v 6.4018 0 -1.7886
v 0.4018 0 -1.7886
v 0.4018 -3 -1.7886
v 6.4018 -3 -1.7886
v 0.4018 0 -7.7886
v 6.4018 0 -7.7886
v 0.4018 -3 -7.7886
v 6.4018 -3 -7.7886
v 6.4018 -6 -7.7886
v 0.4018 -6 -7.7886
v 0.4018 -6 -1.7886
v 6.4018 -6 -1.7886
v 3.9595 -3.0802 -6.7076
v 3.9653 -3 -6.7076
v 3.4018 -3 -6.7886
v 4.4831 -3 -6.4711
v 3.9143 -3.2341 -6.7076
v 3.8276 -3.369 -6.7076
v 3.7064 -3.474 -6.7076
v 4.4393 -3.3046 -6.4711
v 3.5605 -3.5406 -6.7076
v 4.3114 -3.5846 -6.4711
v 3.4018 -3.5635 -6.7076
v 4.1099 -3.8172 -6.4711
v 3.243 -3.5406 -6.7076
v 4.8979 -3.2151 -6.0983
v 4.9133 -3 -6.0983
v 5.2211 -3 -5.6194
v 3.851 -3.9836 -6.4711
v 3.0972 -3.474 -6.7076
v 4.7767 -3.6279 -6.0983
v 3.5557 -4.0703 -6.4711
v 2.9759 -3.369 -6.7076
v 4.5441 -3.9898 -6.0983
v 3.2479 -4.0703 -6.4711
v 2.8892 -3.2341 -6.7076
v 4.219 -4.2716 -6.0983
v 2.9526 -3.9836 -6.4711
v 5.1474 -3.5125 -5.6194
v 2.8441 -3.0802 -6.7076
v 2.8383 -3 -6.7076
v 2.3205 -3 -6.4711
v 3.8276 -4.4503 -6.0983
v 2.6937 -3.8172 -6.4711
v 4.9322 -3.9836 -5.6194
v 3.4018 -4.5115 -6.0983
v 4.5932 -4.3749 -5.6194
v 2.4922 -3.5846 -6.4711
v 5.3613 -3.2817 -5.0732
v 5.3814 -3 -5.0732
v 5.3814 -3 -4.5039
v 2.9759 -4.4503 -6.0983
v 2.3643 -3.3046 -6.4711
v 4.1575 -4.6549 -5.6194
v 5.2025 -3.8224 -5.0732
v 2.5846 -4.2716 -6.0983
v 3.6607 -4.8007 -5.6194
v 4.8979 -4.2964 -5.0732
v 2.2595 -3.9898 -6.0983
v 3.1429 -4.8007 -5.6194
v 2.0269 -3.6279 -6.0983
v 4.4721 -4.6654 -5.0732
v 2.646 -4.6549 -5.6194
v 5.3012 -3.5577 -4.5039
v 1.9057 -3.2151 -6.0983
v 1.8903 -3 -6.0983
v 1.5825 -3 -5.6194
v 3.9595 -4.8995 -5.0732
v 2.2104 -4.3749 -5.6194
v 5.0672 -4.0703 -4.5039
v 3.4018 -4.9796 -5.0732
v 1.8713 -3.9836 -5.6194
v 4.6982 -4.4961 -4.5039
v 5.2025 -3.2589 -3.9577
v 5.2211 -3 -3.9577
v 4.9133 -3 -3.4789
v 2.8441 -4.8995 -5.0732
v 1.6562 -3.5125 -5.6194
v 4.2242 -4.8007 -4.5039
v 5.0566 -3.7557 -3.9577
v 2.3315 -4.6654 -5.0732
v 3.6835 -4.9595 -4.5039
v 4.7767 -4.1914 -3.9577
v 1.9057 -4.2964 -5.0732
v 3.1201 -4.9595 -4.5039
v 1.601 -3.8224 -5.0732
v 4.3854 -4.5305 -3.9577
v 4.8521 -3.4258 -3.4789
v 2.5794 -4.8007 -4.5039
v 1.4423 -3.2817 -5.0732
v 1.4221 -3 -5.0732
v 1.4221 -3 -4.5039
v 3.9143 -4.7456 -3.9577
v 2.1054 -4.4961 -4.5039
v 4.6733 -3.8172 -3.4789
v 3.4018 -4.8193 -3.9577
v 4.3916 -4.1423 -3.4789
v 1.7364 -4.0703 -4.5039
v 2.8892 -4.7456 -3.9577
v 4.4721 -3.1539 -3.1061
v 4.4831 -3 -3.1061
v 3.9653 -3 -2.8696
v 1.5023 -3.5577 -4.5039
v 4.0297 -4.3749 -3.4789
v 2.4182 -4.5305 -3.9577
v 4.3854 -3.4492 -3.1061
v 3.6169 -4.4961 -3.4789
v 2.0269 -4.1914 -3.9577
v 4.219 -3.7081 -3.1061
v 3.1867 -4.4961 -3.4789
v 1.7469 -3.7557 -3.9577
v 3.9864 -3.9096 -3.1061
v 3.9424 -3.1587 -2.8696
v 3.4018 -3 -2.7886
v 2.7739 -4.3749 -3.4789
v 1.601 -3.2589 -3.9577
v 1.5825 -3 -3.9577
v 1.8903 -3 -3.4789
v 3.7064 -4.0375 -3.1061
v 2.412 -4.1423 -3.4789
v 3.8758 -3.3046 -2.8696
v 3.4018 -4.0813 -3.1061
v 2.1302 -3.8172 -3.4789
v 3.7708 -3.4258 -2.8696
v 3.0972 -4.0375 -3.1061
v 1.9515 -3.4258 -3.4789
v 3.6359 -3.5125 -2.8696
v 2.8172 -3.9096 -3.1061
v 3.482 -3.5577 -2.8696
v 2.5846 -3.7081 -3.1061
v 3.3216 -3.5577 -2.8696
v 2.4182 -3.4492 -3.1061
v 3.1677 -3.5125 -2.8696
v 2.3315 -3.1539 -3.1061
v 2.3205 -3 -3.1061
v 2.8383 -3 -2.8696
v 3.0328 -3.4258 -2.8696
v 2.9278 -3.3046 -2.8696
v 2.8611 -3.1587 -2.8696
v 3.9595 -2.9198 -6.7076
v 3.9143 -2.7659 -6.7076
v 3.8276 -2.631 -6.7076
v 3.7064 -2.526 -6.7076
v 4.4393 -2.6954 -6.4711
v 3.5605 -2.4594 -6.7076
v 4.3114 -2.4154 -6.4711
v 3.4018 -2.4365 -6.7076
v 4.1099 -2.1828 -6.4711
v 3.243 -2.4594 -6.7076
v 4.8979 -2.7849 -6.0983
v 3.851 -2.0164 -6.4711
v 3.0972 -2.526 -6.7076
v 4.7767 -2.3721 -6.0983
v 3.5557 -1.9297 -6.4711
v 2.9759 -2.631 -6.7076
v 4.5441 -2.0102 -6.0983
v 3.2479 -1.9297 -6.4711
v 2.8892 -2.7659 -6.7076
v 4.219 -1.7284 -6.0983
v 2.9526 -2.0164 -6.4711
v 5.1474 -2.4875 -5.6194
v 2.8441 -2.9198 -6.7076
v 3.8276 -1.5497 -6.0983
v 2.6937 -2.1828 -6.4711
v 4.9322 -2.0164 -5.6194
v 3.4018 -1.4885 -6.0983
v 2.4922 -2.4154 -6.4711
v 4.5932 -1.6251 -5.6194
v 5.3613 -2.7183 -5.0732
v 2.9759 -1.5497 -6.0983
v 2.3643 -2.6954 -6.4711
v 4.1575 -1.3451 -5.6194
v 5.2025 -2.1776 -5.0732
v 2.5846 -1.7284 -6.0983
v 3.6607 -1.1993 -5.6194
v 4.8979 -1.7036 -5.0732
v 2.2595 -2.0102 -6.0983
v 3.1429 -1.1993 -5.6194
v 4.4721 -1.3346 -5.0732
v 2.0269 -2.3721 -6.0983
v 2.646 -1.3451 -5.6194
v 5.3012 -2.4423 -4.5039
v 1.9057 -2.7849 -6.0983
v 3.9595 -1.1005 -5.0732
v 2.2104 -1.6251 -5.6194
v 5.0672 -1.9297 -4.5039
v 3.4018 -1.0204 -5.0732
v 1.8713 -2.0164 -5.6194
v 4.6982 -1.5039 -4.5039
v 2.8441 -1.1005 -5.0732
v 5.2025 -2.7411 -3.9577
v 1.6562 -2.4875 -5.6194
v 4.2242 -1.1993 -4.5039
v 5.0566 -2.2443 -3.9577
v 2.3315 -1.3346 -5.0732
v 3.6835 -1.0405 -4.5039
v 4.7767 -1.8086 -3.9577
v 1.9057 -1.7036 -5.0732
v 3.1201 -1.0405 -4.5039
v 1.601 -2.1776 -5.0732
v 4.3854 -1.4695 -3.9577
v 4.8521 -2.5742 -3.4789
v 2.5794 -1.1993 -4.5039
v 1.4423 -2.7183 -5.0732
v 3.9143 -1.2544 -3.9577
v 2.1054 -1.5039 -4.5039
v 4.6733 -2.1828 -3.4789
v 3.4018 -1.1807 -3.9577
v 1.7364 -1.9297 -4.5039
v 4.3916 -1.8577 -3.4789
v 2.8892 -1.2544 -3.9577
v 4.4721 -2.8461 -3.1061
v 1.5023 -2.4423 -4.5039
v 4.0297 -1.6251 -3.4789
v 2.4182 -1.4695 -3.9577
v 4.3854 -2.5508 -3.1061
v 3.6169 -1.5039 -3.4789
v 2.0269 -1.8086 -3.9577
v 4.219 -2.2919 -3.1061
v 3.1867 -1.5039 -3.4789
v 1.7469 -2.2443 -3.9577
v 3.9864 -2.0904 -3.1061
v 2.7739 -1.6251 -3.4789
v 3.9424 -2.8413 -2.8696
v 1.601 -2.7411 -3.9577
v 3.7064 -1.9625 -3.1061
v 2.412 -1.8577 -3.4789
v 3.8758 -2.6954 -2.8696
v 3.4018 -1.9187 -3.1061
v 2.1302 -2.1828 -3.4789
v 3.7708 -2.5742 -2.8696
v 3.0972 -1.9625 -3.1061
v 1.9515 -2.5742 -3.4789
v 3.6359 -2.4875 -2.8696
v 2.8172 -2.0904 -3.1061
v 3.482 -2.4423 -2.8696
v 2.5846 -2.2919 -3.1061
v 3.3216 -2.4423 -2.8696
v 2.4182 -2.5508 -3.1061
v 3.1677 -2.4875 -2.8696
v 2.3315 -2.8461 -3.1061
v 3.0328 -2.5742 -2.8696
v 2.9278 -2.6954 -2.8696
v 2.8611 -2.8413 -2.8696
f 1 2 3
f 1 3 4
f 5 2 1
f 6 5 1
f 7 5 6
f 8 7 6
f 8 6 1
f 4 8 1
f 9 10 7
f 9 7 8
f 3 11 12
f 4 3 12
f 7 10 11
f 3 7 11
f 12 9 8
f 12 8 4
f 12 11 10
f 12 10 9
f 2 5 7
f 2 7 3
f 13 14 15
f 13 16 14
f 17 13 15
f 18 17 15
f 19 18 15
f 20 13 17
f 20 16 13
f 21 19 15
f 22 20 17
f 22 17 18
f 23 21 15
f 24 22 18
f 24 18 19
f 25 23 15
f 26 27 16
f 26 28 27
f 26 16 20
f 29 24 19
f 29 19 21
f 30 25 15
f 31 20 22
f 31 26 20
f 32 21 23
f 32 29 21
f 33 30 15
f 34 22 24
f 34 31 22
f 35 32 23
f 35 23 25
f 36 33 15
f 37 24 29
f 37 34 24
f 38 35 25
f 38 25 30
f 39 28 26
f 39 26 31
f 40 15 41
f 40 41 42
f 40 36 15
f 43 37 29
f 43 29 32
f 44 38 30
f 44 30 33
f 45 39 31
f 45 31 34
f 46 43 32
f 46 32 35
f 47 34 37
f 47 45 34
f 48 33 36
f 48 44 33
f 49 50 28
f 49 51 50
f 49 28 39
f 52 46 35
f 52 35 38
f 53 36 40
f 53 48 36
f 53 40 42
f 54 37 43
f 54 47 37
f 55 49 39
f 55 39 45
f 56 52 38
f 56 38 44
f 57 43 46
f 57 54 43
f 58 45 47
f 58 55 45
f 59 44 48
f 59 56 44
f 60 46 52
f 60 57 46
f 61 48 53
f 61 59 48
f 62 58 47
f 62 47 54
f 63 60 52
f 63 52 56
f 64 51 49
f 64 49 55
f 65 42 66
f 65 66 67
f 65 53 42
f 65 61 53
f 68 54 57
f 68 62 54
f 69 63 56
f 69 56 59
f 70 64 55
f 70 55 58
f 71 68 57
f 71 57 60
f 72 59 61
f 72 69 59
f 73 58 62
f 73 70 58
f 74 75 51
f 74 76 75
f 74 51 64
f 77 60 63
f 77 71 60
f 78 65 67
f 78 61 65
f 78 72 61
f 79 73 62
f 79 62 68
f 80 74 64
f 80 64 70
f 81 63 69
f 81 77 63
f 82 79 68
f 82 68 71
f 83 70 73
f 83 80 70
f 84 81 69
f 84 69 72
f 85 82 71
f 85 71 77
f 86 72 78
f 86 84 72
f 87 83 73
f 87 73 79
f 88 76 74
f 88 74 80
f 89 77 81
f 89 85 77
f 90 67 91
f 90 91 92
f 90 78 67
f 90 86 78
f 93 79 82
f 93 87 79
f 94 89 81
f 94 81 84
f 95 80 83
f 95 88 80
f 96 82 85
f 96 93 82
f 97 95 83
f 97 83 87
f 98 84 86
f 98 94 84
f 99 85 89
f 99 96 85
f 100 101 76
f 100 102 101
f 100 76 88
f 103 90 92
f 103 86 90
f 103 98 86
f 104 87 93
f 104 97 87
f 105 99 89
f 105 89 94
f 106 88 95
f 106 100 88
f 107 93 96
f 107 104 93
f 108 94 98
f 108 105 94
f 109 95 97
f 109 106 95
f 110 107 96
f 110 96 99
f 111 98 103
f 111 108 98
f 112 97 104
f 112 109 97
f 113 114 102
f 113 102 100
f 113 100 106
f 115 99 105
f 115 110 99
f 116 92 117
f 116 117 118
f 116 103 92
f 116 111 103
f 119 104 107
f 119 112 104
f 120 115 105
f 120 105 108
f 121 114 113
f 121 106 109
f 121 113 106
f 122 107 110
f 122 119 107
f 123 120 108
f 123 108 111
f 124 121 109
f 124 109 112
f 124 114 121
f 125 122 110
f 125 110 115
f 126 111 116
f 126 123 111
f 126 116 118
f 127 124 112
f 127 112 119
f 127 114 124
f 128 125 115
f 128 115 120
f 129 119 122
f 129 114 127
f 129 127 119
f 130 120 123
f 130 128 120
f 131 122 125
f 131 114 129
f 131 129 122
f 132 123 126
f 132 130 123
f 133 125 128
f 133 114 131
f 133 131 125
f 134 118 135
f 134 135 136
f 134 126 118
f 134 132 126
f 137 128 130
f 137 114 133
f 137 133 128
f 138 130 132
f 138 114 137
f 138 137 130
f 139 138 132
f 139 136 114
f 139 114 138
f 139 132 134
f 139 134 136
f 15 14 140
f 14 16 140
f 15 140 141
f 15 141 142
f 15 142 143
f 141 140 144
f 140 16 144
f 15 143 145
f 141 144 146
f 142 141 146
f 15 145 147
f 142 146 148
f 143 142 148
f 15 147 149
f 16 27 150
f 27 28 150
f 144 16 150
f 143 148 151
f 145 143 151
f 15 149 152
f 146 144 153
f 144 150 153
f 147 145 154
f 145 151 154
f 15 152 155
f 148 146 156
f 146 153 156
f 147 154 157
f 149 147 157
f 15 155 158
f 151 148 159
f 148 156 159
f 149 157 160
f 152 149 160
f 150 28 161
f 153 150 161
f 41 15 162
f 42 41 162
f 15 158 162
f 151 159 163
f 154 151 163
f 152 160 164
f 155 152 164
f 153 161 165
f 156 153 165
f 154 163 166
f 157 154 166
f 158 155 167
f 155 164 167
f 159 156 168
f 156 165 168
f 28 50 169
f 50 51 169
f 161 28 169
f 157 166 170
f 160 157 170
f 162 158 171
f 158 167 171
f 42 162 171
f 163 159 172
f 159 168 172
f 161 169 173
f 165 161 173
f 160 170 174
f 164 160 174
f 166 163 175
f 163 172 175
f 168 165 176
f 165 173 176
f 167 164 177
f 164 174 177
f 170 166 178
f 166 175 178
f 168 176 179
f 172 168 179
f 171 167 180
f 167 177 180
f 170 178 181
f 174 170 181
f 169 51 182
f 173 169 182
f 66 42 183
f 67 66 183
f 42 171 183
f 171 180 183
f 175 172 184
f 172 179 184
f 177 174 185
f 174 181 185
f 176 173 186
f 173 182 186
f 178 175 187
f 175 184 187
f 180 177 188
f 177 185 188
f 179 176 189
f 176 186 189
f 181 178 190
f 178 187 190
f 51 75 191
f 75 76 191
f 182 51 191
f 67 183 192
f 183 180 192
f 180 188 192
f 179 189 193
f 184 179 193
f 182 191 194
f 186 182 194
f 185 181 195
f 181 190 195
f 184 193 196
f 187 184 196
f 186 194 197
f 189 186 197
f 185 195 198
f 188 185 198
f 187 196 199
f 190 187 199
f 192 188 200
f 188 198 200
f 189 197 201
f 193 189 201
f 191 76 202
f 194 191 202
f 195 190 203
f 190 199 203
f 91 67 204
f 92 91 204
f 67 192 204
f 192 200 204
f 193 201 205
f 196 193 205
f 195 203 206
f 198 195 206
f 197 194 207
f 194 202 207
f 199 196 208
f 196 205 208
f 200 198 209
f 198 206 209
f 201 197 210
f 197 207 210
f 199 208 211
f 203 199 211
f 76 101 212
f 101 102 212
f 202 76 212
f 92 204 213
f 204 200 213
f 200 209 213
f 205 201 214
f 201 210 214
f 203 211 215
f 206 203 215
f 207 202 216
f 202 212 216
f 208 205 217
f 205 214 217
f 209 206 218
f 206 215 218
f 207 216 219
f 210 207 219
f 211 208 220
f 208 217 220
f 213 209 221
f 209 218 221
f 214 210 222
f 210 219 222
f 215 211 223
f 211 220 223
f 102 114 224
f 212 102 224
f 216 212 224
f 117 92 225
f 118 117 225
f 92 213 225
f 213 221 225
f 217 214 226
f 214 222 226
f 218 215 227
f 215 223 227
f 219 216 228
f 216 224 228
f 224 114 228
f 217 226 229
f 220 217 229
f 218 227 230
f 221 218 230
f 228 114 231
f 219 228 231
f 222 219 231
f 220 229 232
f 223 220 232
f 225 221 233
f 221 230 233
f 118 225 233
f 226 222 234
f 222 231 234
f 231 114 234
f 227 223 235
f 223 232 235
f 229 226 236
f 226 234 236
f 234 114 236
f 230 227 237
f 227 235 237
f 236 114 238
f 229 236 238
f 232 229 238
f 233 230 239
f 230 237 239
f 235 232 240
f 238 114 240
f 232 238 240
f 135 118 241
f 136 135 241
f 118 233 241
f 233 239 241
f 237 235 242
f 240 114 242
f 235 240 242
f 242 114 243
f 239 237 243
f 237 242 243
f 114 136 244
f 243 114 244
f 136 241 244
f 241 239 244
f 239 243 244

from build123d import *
from build123d import SkipClean  # not in build123d's __all__

# Parameters (mm, degrees)
F0_W     = 6
F0_H     = 6
F1_DEPTH = 3
F3_ANGLE = 180


with BuildPart() as f1:
    # F0 (on Front) → F1 (new body)
    with BuildSketch(Plane.XZ):
        with Locations((3.4017860889, -4.7885723032)):
            Rectangle(F0_W, F0_H)
    extrude(amount=F1_DEPTH)

    # F2 (on face) → F3 (revolve, cut)
    with BuildSketch(Plane.XZ.offset(3)):
        with BuildLine():
            ThreePointArc((3.4017860889, -6.7885723032), (5.4017860889, -4.7885723032), (3.4017860889, -2.7885723032))
            Line((3.4017860889, -2.7885723032), (3.4017860889, -6.7885723032))
        make_face()
    revolve(axis=Axis((3.4017860889, -3, -4.7885723032), (0, 0, 1)), revolution_arc=F3_ANGLE, mode=Mode.SUBTRACT)

    # F4: F1 across face


with BuildPart() as f1_1:
    add(f1.part, clean=False)
    with SkipClean():  # cleaning this boolean's faces spoils the solid; the shape is the same uncleaned
        add(f1.part.mirror(Plane(origin=(3.4017860889, -3, -4.7885723032), x_dir=(1, 0, 0), z_dir=(0, -1, 0))), clean=False)


solid = f1_1.part
